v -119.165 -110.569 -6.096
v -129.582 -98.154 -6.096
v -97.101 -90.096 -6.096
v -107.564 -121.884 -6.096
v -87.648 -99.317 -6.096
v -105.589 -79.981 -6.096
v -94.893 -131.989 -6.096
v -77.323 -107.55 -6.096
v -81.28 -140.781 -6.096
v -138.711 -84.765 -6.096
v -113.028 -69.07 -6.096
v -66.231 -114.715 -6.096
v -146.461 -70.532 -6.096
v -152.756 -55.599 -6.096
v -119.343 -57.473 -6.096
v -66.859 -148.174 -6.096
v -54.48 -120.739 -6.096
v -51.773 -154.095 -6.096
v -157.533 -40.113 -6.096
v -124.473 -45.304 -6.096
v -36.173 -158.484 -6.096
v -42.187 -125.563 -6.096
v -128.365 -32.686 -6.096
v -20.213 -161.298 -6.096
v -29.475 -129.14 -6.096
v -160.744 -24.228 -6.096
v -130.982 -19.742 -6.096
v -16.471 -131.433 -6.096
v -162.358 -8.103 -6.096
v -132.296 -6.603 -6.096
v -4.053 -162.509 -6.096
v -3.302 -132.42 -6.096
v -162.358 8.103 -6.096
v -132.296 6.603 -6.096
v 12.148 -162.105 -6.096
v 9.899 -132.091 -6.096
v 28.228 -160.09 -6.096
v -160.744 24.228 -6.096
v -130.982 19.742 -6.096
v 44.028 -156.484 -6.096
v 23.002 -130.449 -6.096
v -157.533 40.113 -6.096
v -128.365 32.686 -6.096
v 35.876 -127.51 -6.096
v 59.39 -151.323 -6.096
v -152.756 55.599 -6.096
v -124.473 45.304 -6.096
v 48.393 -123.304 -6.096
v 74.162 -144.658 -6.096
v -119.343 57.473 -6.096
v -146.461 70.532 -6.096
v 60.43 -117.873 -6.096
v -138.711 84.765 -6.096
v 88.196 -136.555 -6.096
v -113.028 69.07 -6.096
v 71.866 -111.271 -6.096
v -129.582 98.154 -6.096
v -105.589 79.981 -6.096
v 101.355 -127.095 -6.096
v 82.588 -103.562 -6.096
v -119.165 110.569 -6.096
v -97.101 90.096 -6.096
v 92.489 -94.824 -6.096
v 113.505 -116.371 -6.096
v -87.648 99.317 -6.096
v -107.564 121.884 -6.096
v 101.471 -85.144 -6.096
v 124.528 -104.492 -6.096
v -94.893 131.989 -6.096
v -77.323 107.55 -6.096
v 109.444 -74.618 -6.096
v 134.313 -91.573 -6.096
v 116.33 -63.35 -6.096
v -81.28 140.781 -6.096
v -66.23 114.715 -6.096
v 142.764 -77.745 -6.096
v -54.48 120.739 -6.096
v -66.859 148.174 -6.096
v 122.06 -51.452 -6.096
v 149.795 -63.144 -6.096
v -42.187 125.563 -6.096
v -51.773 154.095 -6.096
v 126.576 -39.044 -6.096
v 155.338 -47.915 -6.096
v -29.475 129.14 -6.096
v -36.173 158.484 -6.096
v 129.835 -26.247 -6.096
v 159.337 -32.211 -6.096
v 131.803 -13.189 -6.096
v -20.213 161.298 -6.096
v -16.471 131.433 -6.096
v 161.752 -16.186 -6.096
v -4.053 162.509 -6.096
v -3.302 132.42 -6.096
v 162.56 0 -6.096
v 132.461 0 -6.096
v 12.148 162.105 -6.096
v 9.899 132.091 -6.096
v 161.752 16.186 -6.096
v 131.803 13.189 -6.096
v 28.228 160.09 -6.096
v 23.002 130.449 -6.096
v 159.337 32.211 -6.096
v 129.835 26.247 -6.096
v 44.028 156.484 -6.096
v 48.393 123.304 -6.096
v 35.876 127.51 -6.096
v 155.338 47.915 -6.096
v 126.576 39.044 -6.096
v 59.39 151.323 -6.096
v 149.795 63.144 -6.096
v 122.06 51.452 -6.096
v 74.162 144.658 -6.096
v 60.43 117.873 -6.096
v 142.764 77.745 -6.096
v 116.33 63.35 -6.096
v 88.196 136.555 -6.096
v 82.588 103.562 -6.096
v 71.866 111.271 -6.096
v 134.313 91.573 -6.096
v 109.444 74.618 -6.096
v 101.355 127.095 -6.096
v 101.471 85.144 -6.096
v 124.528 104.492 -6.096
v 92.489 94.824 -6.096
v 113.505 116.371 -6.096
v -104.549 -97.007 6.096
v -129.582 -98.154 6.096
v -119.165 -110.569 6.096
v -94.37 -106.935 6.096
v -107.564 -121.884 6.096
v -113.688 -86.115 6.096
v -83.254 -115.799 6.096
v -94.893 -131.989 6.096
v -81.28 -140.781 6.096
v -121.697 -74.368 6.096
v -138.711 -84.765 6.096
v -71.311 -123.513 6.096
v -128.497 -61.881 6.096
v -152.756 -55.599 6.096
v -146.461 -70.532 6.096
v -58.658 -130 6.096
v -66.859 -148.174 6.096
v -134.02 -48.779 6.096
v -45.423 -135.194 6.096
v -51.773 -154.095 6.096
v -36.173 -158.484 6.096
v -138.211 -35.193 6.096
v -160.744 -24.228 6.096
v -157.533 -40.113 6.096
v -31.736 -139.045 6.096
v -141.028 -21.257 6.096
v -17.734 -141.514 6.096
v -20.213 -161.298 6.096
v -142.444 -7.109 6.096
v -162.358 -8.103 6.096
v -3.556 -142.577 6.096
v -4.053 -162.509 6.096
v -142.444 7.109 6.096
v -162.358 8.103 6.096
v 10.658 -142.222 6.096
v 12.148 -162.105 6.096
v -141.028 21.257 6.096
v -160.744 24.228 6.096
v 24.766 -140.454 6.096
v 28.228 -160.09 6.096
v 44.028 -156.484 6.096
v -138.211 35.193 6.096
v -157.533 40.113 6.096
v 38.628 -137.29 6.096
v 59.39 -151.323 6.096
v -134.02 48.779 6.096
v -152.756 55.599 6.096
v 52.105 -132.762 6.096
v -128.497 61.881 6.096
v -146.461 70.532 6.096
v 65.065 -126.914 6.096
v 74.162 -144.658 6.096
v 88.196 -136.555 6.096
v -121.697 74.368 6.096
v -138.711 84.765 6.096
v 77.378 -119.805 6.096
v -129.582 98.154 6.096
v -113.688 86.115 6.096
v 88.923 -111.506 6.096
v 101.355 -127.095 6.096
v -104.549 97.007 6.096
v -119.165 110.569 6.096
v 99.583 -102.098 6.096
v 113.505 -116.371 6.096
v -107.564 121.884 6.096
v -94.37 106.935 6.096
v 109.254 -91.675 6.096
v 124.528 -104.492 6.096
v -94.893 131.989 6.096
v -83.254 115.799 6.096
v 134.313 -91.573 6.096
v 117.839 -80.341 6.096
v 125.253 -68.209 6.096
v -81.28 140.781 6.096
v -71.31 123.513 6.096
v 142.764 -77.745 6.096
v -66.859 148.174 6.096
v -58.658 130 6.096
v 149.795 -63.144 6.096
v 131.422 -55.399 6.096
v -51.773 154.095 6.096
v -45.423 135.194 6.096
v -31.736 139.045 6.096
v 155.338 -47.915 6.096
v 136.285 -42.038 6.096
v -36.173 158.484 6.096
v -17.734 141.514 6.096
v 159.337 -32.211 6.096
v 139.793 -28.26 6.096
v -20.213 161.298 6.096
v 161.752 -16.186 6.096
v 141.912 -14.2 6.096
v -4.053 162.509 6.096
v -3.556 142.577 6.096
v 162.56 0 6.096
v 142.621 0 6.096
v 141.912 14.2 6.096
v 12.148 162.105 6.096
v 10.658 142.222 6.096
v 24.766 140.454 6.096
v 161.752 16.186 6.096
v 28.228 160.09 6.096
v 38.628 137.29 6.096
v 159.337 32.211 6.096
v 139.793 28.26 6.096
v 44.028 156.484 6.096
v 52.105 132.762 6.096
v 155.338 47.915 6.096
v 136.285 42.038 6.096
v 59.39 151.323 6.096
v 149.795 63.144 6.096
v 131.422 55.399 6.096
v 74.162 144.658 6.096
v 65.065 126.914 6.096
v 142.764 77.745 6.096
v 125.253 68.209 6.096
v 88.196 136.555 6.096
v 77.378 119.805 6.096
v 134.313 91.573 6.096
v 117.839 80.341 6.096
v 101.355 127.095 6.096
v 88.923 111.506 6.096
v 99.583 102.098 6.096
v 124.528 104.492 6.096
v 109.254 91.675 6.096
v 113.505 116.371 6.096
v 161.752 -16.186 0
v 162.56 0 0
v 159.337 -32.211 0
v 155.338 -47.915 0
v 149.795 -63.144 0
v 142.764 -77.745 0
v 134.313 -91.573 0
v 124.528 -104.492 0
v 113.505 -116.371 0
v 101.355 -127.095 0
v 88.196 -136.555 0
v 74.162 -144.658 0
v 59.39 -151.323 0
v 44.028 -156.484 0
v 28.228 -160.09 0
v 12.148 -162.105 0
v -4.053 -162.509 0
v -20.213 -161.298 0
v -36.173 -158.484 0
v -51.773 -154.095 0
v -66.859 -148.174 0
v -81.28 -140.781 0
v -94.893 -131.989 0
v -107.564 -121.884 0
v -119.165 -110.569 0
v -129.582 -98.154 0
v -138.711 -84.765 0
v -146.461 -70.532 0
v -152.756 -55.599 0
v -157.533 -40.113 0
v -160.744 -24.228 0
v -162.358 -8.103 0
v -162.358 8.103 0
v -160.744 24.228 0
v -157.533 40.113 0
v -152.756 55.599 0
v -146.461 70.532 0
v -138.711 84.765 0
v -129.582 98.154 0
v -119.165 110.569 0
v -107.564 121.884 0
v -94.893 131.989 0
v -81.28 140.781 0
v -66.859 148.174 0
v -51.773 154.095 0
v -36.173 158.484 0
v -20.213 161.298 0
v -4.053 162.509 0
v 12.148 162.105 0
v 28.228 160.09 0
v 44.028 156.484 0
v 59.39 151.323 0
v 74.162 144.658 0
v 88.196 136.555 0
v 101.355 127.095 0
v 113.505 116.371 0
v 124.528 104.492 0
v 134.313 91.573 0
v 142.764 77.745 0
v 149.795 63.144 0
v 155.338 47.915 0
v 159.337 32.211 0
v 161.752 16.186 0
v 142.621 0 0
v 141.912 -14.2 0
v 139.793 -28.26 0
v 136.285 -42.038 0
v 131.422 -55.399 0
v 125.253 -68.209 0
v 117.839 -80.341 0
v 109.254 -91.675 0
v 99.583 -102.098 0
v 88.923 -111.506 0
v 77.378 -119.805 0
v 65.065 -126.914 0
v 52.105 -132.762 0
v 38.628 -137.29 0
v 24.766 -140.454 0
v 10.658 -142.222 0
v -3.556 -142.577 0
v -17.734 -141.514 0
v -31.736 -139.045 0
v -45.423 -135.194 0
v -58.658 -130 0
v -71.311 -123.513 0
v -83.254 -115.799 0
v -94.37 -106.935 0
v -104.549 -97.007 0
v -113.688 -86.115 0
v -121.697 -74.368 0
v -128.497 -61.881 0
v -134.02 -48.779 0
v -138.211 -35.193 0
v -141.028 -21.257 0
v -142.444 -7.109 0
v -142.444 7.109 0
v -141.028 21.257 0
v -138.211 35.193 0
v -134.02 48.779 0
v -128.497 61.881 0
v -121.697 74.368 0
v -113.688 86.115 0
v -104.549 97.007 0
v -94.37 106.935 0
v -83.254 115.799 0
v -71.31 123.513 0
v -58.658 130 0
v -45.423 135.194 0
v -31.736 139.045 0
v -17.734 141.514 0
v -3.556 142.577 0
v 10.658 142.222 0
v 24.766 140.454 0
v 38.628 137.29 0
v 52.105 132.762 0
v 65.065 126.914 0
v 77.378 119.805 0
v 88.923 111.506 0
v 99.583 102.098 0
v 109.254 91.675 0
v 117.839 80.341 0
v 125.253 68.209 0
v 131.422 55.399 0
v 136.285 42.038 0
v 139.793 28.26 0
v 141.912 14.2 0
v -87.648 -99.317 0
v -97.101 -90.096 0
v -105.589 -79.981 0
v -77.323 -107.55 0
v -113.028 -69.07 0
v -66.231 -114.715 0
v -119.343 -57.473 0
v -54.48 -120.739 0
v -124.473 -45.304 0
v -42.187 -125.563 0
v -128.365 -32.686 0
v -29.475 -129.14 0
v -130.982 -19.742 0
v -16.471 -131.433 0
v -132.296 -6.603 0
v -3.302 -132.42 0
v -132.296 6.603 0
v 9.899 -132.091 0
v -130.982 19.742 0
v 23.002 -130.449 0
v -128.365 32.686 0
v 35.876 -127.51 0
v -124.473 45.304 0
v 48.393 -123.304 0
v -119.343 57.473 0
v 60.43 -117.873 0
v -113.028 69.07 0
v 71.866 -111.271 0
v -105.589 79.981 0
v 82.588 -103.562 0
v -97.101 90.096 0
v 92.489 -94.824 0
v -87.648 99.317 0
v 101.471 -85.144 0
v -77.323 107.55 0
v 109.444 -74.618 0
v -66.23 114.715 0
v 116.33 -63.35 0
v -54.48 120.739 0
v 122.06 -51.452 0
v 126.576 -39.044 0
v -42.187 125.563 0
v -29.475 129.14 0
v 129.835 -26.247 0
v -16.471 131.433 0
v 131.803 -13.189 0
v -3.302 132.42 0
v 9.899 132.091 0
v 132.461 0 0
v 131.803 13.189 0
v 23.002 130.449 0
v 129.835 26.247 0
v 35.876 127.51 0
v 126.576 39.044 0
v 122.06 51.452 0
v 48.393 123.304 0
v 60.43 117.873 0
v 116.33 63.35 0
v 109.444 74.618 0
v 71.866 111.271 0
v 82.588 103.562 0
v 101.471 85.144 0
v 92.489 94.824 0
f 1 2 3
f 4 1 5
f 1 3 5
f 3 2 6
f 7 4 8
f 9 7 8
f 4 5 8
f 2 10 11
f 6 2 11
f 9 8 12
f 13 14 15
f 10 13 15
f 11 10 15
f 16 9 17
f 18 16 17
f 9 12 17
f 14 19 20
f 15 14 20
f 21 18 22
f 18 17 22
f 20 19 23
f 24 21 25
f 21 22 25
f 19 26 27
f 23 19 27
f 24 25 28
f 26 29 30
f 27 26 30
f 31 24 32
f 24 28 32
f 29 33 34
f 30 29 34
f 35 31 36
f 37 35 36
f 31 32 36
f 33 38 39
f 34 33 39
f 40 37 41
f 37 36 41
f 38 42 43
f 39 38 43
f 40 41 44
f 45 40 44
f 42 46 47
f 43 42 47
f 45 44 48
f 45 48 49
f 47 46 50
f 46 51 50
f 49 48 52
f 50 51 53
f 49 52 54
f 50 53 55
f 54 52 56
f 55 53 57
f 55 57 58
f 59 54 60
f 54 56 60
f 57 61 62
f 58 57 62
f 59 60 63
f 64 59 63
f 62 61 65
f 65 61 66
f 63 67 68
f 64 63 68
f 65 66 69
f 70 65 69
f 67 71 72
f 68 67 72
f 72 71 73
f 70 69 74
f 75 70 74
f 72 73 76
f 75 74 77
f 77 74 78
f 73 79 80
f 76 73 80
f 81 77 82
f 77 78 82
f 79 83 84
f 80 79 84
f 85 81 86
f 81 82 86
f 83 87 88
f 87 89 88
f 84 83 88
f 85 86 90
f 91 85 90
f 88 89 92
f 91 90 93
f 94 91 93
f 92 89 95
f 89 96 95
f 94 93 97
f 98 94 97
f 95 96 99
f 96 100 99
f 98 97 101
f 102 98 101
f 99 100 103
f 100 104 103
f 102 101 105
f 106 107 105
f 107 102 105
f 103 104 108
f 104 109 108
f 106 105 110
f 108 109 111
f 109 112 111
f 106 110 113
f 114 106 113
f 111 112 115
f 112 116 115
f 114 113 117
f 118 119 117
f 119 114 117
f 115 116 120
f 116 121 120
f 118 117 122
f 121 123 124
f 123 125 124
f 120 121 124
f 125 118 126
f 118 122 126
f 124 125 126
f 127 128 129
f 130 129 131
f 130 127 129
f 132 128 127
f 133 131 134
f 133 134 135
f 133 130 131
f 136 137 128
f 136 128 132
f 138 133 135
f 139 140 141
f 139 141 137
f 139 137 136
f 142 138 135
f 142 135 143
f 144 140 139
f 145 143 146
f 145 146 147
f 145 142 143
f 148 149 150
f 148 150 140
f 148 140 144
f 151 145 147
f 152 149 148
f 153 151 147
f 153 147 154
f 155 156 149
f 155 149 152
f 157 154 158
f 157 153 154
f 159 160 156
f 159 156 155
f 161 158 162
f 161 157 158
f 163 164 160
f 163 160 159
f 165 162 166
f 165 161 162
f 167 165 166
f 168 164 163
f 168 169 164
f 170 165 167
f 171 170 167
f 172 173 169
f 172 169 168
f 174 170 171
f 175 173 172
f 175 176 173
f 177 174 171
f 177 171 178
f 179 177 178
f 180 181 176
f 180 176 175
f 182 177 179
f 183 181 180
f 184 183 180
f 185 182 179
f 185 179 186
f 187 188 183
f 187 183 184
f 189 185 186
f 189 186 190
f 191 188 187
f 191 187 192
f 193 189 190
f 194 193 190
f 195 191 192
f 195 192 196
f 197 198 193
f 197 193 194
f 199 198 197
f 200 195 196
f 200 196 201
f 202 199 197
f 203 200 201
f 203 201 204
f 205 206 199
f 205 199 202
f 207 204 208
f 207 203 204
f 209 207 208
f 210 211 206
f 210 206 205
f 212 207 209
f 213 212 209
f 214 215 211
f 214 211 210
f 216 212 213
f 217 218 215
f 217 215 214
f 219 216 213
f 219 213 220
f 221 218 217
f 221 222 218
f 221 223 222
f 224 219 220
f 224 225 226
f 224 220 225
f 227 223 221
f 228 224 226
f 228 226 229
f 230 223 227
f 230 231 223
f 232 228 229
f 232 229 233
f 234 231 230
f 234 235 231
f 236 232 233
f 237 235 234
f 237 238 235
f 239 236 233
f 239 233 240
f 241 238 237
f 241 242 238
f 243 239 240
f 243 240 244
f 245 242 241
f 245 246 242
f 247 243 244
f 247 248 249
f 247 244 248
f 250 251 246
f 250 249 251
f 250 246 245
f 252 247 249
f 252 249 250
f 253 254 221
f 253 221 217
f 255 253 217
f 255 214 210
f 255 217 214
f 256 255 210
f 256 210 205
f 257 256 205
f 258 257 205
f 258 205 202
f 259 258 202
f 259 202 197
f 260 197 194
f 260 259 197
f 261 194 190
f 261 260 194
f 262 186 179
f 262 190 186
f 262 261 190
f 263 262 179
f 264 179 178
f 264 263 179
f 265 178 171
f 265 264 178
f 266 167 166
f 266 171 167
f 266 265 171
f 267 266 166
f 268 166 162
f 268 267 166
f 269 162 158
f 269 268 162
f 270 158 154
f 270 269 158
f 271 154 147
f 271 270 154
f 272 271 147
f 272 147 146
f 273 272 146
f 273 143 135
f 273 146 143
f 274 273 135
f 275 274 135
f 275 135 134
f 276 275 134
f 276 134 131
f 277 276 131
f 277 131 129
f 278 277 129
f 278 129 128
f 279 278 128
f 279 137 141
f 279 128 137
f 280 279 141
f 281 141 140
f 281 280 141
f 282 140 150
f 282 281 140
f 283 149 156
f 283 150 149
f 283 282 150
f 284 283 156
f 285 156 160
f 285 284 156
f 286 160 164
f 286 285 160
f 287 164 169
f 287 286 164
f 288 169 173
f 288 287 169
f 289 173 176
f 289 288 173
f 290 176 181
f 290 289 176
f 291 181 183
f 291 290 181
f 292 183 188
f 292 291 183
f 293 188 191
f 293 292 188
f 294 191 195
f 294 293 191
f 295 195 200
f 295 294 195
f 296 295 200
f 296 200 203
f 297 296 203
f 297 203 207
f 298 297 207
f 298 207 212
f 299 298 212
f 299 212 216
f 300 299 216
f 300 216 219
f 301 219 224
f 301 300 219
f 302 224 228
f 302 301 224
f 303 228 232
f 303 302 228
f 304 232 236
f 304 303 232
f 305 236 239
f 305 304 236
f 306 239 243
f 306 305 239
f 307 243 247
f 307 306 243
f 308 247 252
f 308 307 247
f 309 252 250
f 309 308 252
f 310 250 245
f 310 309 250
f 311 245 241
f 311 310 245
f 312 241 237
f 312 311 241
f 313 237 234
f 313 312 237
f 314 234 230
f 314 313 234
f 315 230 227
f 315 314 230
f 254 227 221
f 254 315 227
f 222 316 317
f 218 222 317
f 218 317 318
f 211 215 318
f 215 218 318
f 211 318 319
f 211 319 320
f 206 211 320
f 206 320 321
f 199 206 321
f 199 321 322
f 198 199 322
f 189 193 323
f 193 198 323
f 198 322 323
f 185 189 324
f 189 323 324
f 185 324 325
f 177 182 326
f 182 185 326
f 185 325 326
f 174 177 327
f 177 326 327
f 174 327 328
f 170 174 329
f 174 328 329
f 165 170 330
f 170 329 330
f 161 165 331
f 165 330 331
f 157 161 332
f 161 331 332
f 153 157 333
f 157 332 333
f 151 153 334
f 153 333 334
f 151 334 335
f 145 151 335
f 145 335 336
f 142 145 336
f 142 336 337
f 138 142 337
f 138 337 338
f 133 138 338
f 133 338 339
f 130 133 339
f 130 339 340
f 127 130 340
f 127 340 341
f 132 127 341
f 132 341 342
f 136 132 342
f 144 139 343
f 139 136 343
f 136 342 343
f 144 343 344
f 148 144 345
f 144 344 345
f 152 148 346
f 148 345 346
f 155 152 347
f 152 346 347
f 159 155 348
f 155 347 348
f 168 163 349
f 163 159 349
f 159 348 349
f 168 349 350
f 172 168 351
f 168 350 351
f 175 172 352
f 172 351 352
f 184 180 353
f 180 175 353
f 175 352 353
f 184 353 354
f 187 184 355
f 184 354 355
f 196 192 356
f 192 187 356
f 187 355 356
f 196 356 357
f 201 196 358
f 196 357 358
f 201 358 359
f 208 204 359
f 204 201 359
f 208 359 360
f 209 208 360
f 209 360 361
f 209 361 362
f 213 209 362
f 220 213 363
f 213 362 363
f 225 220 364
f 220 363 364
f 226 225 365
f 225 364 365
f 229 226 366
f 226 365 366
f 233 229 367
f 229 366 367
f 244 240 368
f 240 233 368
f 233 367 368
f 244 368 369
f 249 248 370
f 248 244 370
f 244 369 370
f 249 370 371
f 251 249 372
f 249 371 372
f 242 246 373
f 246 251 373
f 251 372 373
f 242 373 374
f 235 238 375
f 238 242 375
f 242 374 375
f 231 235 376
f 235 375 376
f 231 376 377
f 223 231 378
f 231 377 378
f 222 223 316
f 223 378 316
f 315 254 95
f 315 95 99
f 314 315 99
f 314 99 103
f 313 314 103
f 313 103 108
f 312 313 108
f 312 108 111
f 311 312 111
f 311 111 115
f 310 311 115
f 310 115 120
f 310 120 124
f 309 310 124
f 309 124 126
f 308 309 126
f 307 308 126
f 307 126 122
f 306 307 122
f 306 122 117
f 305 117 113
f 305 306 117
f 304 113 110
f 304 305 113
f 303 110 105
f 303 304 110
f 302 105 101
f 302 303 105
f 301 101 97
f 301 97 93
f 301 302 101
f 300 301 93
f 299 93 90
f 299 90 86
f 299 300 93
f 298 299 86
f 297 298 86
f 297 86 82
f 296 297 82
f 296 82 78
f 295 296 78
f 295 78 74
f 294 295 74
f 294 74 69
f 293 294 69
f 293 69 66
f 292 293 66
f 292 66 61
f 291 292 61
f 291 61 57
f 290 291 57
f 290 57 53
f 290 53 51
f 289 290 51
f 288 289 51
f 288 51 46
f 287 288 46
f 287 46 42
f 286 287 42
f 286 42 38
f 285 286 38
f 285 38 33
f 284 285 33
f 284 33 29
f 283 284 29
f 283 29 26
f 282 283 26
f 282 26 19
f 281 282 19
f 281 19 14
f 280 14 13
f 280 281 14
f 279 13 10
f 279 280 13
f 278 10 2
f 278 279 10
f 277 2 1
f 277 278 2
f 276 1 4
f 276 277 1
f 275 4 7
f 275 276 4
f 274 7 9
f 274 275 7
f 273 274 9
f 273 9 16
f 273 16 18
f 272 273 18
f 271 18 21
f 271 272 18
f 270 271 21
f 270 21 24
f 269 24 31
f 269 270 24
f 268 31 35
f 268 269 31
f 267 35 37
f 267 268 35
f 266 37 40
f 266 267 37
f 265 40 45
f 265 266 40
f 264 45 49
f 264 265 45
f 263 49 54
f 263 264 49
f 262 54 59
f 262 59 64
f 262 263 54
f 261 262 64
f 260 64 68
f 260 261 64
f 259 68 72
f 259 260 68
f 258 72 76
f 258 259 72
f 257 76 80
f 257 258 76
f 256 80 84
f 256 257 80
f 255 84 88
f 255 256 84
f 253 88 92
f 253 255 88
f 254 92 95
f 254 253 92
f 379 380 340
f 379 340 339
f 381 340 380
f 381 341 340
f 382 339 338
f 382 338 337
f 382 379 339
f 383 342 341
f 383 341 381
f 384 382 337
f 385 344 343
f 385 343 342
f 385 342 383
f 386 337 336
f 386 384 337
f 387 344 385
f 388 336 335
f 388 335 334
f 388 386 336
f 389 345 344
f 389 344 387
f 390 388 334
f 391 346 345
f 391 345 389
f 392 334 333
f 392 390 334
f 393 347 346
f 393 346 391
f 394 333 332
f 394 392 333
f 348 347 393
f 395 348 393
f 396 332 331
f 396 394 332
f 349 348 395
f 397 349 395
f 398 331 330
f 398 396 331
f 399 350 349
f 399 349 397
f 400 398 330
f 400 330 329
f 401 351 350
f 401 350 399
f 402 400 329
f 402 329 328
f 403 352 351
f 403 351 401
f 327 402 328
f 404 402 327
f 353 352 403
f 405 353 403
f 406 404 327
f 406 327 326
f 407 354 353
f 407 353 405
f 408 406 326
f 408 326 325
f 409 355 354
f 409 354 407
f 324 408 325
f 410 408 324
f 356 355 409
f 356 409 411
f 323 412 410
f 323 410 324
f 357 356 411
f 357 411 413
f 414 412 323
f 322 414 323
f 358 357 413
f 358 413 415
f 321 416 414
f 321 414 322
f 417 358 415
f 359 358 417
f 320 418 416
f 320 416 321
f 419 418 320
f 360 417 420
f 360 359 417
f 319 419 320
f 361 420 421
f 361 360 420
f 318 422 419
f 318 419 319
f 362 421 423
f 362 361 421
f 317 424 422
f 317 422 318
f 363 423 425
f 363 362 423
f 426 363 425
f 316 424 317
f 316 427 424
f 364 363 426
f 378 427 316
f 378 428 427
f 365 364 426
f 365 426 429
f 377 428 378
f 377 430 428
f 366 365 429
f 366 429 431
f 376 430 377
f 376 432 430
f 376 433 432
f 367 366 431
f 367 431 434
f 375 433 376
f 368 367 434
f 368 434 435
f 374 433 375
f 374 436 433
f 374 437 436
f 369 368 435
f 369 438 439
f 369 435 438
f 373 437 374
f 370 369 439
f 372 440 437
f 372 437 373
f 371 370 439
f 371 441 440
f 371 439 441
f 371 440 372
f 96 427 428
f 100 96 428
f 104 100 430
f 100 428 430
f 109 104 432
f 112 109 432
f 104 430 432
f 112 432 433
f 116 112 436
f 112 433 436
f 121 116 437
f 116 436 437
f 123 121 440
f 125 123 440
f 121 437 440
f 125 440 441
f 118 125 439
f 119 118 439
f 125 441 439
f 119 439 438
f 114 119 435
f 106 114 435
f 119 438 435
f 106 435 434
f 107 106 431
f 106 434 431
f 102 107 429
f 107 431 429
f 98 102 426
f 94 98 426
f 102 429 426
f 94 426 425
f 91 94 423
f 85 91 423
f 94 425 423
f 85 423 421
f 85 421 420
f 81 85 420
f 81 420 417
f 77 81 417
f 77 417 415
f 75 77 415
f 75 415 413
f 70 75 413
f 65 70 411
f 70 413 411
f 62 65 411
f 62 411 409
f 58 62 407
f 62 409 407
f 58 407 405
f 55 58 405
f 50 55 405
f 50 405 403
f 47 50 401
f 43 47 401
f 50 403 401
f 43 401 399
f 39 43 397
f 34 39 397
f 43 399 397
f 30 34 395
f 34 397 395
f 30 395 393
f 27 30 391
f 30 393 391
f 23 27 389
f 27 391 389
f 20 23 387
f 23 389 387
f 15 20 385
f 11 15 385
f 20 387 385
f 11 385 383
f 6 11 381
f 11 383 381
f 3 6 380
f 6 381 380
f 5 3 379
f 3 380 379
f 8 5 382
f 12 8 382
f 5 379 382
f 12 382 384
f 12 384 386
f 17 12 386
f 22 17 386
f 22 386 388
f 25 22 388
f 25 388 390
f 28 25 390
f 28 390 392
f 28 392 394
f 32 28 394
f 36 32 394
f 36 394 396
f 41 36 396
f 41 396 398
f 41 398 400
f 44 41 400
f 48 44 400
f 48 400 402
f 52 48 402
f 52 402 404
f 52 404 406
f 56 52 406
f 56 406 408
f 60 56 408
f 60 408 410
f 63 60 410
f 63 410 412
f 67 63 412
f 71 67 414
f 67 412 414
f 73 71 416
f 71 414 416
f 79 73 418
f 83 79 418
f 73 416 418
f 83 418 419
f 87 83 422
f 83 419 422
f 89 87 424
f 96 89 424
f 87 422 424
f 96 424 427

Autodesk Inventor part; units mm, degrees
ref_plane "YZ Plane" through (0, 0, 0) normal (1, 0, 0) x (0, 1, 0)
ref_plane "XZ Plane" through (0, 0, 0) normal (0, 1, 0) x (-1, 0, 0)
ref_plane "XY Plane" through (0, 0, 0) normal (0, 0, 1) x (1, 0, 0)
sketch "Sketch1" plane through (0, 0, 0) normal (0, 0, 1) x (1, 0, 0)
  circle A0 centre (0, 0) radius 142.621
  circle A1 centre (0, 0) radius 162.56
  circle A2 centre (0, 0) radius 132.461
  dimension "d0" = 285.242
  dimension "d1" = 325.12
  dimension "d2" = 264.922
extrude "Extrusion1" add sketch "Sketch1" against normal blind 6.096 contours A0 | A1
extrude "Extrusion2" add sketch "Sketch1" along normal blind 6.096 contours A1
properties part number "outer piece"
